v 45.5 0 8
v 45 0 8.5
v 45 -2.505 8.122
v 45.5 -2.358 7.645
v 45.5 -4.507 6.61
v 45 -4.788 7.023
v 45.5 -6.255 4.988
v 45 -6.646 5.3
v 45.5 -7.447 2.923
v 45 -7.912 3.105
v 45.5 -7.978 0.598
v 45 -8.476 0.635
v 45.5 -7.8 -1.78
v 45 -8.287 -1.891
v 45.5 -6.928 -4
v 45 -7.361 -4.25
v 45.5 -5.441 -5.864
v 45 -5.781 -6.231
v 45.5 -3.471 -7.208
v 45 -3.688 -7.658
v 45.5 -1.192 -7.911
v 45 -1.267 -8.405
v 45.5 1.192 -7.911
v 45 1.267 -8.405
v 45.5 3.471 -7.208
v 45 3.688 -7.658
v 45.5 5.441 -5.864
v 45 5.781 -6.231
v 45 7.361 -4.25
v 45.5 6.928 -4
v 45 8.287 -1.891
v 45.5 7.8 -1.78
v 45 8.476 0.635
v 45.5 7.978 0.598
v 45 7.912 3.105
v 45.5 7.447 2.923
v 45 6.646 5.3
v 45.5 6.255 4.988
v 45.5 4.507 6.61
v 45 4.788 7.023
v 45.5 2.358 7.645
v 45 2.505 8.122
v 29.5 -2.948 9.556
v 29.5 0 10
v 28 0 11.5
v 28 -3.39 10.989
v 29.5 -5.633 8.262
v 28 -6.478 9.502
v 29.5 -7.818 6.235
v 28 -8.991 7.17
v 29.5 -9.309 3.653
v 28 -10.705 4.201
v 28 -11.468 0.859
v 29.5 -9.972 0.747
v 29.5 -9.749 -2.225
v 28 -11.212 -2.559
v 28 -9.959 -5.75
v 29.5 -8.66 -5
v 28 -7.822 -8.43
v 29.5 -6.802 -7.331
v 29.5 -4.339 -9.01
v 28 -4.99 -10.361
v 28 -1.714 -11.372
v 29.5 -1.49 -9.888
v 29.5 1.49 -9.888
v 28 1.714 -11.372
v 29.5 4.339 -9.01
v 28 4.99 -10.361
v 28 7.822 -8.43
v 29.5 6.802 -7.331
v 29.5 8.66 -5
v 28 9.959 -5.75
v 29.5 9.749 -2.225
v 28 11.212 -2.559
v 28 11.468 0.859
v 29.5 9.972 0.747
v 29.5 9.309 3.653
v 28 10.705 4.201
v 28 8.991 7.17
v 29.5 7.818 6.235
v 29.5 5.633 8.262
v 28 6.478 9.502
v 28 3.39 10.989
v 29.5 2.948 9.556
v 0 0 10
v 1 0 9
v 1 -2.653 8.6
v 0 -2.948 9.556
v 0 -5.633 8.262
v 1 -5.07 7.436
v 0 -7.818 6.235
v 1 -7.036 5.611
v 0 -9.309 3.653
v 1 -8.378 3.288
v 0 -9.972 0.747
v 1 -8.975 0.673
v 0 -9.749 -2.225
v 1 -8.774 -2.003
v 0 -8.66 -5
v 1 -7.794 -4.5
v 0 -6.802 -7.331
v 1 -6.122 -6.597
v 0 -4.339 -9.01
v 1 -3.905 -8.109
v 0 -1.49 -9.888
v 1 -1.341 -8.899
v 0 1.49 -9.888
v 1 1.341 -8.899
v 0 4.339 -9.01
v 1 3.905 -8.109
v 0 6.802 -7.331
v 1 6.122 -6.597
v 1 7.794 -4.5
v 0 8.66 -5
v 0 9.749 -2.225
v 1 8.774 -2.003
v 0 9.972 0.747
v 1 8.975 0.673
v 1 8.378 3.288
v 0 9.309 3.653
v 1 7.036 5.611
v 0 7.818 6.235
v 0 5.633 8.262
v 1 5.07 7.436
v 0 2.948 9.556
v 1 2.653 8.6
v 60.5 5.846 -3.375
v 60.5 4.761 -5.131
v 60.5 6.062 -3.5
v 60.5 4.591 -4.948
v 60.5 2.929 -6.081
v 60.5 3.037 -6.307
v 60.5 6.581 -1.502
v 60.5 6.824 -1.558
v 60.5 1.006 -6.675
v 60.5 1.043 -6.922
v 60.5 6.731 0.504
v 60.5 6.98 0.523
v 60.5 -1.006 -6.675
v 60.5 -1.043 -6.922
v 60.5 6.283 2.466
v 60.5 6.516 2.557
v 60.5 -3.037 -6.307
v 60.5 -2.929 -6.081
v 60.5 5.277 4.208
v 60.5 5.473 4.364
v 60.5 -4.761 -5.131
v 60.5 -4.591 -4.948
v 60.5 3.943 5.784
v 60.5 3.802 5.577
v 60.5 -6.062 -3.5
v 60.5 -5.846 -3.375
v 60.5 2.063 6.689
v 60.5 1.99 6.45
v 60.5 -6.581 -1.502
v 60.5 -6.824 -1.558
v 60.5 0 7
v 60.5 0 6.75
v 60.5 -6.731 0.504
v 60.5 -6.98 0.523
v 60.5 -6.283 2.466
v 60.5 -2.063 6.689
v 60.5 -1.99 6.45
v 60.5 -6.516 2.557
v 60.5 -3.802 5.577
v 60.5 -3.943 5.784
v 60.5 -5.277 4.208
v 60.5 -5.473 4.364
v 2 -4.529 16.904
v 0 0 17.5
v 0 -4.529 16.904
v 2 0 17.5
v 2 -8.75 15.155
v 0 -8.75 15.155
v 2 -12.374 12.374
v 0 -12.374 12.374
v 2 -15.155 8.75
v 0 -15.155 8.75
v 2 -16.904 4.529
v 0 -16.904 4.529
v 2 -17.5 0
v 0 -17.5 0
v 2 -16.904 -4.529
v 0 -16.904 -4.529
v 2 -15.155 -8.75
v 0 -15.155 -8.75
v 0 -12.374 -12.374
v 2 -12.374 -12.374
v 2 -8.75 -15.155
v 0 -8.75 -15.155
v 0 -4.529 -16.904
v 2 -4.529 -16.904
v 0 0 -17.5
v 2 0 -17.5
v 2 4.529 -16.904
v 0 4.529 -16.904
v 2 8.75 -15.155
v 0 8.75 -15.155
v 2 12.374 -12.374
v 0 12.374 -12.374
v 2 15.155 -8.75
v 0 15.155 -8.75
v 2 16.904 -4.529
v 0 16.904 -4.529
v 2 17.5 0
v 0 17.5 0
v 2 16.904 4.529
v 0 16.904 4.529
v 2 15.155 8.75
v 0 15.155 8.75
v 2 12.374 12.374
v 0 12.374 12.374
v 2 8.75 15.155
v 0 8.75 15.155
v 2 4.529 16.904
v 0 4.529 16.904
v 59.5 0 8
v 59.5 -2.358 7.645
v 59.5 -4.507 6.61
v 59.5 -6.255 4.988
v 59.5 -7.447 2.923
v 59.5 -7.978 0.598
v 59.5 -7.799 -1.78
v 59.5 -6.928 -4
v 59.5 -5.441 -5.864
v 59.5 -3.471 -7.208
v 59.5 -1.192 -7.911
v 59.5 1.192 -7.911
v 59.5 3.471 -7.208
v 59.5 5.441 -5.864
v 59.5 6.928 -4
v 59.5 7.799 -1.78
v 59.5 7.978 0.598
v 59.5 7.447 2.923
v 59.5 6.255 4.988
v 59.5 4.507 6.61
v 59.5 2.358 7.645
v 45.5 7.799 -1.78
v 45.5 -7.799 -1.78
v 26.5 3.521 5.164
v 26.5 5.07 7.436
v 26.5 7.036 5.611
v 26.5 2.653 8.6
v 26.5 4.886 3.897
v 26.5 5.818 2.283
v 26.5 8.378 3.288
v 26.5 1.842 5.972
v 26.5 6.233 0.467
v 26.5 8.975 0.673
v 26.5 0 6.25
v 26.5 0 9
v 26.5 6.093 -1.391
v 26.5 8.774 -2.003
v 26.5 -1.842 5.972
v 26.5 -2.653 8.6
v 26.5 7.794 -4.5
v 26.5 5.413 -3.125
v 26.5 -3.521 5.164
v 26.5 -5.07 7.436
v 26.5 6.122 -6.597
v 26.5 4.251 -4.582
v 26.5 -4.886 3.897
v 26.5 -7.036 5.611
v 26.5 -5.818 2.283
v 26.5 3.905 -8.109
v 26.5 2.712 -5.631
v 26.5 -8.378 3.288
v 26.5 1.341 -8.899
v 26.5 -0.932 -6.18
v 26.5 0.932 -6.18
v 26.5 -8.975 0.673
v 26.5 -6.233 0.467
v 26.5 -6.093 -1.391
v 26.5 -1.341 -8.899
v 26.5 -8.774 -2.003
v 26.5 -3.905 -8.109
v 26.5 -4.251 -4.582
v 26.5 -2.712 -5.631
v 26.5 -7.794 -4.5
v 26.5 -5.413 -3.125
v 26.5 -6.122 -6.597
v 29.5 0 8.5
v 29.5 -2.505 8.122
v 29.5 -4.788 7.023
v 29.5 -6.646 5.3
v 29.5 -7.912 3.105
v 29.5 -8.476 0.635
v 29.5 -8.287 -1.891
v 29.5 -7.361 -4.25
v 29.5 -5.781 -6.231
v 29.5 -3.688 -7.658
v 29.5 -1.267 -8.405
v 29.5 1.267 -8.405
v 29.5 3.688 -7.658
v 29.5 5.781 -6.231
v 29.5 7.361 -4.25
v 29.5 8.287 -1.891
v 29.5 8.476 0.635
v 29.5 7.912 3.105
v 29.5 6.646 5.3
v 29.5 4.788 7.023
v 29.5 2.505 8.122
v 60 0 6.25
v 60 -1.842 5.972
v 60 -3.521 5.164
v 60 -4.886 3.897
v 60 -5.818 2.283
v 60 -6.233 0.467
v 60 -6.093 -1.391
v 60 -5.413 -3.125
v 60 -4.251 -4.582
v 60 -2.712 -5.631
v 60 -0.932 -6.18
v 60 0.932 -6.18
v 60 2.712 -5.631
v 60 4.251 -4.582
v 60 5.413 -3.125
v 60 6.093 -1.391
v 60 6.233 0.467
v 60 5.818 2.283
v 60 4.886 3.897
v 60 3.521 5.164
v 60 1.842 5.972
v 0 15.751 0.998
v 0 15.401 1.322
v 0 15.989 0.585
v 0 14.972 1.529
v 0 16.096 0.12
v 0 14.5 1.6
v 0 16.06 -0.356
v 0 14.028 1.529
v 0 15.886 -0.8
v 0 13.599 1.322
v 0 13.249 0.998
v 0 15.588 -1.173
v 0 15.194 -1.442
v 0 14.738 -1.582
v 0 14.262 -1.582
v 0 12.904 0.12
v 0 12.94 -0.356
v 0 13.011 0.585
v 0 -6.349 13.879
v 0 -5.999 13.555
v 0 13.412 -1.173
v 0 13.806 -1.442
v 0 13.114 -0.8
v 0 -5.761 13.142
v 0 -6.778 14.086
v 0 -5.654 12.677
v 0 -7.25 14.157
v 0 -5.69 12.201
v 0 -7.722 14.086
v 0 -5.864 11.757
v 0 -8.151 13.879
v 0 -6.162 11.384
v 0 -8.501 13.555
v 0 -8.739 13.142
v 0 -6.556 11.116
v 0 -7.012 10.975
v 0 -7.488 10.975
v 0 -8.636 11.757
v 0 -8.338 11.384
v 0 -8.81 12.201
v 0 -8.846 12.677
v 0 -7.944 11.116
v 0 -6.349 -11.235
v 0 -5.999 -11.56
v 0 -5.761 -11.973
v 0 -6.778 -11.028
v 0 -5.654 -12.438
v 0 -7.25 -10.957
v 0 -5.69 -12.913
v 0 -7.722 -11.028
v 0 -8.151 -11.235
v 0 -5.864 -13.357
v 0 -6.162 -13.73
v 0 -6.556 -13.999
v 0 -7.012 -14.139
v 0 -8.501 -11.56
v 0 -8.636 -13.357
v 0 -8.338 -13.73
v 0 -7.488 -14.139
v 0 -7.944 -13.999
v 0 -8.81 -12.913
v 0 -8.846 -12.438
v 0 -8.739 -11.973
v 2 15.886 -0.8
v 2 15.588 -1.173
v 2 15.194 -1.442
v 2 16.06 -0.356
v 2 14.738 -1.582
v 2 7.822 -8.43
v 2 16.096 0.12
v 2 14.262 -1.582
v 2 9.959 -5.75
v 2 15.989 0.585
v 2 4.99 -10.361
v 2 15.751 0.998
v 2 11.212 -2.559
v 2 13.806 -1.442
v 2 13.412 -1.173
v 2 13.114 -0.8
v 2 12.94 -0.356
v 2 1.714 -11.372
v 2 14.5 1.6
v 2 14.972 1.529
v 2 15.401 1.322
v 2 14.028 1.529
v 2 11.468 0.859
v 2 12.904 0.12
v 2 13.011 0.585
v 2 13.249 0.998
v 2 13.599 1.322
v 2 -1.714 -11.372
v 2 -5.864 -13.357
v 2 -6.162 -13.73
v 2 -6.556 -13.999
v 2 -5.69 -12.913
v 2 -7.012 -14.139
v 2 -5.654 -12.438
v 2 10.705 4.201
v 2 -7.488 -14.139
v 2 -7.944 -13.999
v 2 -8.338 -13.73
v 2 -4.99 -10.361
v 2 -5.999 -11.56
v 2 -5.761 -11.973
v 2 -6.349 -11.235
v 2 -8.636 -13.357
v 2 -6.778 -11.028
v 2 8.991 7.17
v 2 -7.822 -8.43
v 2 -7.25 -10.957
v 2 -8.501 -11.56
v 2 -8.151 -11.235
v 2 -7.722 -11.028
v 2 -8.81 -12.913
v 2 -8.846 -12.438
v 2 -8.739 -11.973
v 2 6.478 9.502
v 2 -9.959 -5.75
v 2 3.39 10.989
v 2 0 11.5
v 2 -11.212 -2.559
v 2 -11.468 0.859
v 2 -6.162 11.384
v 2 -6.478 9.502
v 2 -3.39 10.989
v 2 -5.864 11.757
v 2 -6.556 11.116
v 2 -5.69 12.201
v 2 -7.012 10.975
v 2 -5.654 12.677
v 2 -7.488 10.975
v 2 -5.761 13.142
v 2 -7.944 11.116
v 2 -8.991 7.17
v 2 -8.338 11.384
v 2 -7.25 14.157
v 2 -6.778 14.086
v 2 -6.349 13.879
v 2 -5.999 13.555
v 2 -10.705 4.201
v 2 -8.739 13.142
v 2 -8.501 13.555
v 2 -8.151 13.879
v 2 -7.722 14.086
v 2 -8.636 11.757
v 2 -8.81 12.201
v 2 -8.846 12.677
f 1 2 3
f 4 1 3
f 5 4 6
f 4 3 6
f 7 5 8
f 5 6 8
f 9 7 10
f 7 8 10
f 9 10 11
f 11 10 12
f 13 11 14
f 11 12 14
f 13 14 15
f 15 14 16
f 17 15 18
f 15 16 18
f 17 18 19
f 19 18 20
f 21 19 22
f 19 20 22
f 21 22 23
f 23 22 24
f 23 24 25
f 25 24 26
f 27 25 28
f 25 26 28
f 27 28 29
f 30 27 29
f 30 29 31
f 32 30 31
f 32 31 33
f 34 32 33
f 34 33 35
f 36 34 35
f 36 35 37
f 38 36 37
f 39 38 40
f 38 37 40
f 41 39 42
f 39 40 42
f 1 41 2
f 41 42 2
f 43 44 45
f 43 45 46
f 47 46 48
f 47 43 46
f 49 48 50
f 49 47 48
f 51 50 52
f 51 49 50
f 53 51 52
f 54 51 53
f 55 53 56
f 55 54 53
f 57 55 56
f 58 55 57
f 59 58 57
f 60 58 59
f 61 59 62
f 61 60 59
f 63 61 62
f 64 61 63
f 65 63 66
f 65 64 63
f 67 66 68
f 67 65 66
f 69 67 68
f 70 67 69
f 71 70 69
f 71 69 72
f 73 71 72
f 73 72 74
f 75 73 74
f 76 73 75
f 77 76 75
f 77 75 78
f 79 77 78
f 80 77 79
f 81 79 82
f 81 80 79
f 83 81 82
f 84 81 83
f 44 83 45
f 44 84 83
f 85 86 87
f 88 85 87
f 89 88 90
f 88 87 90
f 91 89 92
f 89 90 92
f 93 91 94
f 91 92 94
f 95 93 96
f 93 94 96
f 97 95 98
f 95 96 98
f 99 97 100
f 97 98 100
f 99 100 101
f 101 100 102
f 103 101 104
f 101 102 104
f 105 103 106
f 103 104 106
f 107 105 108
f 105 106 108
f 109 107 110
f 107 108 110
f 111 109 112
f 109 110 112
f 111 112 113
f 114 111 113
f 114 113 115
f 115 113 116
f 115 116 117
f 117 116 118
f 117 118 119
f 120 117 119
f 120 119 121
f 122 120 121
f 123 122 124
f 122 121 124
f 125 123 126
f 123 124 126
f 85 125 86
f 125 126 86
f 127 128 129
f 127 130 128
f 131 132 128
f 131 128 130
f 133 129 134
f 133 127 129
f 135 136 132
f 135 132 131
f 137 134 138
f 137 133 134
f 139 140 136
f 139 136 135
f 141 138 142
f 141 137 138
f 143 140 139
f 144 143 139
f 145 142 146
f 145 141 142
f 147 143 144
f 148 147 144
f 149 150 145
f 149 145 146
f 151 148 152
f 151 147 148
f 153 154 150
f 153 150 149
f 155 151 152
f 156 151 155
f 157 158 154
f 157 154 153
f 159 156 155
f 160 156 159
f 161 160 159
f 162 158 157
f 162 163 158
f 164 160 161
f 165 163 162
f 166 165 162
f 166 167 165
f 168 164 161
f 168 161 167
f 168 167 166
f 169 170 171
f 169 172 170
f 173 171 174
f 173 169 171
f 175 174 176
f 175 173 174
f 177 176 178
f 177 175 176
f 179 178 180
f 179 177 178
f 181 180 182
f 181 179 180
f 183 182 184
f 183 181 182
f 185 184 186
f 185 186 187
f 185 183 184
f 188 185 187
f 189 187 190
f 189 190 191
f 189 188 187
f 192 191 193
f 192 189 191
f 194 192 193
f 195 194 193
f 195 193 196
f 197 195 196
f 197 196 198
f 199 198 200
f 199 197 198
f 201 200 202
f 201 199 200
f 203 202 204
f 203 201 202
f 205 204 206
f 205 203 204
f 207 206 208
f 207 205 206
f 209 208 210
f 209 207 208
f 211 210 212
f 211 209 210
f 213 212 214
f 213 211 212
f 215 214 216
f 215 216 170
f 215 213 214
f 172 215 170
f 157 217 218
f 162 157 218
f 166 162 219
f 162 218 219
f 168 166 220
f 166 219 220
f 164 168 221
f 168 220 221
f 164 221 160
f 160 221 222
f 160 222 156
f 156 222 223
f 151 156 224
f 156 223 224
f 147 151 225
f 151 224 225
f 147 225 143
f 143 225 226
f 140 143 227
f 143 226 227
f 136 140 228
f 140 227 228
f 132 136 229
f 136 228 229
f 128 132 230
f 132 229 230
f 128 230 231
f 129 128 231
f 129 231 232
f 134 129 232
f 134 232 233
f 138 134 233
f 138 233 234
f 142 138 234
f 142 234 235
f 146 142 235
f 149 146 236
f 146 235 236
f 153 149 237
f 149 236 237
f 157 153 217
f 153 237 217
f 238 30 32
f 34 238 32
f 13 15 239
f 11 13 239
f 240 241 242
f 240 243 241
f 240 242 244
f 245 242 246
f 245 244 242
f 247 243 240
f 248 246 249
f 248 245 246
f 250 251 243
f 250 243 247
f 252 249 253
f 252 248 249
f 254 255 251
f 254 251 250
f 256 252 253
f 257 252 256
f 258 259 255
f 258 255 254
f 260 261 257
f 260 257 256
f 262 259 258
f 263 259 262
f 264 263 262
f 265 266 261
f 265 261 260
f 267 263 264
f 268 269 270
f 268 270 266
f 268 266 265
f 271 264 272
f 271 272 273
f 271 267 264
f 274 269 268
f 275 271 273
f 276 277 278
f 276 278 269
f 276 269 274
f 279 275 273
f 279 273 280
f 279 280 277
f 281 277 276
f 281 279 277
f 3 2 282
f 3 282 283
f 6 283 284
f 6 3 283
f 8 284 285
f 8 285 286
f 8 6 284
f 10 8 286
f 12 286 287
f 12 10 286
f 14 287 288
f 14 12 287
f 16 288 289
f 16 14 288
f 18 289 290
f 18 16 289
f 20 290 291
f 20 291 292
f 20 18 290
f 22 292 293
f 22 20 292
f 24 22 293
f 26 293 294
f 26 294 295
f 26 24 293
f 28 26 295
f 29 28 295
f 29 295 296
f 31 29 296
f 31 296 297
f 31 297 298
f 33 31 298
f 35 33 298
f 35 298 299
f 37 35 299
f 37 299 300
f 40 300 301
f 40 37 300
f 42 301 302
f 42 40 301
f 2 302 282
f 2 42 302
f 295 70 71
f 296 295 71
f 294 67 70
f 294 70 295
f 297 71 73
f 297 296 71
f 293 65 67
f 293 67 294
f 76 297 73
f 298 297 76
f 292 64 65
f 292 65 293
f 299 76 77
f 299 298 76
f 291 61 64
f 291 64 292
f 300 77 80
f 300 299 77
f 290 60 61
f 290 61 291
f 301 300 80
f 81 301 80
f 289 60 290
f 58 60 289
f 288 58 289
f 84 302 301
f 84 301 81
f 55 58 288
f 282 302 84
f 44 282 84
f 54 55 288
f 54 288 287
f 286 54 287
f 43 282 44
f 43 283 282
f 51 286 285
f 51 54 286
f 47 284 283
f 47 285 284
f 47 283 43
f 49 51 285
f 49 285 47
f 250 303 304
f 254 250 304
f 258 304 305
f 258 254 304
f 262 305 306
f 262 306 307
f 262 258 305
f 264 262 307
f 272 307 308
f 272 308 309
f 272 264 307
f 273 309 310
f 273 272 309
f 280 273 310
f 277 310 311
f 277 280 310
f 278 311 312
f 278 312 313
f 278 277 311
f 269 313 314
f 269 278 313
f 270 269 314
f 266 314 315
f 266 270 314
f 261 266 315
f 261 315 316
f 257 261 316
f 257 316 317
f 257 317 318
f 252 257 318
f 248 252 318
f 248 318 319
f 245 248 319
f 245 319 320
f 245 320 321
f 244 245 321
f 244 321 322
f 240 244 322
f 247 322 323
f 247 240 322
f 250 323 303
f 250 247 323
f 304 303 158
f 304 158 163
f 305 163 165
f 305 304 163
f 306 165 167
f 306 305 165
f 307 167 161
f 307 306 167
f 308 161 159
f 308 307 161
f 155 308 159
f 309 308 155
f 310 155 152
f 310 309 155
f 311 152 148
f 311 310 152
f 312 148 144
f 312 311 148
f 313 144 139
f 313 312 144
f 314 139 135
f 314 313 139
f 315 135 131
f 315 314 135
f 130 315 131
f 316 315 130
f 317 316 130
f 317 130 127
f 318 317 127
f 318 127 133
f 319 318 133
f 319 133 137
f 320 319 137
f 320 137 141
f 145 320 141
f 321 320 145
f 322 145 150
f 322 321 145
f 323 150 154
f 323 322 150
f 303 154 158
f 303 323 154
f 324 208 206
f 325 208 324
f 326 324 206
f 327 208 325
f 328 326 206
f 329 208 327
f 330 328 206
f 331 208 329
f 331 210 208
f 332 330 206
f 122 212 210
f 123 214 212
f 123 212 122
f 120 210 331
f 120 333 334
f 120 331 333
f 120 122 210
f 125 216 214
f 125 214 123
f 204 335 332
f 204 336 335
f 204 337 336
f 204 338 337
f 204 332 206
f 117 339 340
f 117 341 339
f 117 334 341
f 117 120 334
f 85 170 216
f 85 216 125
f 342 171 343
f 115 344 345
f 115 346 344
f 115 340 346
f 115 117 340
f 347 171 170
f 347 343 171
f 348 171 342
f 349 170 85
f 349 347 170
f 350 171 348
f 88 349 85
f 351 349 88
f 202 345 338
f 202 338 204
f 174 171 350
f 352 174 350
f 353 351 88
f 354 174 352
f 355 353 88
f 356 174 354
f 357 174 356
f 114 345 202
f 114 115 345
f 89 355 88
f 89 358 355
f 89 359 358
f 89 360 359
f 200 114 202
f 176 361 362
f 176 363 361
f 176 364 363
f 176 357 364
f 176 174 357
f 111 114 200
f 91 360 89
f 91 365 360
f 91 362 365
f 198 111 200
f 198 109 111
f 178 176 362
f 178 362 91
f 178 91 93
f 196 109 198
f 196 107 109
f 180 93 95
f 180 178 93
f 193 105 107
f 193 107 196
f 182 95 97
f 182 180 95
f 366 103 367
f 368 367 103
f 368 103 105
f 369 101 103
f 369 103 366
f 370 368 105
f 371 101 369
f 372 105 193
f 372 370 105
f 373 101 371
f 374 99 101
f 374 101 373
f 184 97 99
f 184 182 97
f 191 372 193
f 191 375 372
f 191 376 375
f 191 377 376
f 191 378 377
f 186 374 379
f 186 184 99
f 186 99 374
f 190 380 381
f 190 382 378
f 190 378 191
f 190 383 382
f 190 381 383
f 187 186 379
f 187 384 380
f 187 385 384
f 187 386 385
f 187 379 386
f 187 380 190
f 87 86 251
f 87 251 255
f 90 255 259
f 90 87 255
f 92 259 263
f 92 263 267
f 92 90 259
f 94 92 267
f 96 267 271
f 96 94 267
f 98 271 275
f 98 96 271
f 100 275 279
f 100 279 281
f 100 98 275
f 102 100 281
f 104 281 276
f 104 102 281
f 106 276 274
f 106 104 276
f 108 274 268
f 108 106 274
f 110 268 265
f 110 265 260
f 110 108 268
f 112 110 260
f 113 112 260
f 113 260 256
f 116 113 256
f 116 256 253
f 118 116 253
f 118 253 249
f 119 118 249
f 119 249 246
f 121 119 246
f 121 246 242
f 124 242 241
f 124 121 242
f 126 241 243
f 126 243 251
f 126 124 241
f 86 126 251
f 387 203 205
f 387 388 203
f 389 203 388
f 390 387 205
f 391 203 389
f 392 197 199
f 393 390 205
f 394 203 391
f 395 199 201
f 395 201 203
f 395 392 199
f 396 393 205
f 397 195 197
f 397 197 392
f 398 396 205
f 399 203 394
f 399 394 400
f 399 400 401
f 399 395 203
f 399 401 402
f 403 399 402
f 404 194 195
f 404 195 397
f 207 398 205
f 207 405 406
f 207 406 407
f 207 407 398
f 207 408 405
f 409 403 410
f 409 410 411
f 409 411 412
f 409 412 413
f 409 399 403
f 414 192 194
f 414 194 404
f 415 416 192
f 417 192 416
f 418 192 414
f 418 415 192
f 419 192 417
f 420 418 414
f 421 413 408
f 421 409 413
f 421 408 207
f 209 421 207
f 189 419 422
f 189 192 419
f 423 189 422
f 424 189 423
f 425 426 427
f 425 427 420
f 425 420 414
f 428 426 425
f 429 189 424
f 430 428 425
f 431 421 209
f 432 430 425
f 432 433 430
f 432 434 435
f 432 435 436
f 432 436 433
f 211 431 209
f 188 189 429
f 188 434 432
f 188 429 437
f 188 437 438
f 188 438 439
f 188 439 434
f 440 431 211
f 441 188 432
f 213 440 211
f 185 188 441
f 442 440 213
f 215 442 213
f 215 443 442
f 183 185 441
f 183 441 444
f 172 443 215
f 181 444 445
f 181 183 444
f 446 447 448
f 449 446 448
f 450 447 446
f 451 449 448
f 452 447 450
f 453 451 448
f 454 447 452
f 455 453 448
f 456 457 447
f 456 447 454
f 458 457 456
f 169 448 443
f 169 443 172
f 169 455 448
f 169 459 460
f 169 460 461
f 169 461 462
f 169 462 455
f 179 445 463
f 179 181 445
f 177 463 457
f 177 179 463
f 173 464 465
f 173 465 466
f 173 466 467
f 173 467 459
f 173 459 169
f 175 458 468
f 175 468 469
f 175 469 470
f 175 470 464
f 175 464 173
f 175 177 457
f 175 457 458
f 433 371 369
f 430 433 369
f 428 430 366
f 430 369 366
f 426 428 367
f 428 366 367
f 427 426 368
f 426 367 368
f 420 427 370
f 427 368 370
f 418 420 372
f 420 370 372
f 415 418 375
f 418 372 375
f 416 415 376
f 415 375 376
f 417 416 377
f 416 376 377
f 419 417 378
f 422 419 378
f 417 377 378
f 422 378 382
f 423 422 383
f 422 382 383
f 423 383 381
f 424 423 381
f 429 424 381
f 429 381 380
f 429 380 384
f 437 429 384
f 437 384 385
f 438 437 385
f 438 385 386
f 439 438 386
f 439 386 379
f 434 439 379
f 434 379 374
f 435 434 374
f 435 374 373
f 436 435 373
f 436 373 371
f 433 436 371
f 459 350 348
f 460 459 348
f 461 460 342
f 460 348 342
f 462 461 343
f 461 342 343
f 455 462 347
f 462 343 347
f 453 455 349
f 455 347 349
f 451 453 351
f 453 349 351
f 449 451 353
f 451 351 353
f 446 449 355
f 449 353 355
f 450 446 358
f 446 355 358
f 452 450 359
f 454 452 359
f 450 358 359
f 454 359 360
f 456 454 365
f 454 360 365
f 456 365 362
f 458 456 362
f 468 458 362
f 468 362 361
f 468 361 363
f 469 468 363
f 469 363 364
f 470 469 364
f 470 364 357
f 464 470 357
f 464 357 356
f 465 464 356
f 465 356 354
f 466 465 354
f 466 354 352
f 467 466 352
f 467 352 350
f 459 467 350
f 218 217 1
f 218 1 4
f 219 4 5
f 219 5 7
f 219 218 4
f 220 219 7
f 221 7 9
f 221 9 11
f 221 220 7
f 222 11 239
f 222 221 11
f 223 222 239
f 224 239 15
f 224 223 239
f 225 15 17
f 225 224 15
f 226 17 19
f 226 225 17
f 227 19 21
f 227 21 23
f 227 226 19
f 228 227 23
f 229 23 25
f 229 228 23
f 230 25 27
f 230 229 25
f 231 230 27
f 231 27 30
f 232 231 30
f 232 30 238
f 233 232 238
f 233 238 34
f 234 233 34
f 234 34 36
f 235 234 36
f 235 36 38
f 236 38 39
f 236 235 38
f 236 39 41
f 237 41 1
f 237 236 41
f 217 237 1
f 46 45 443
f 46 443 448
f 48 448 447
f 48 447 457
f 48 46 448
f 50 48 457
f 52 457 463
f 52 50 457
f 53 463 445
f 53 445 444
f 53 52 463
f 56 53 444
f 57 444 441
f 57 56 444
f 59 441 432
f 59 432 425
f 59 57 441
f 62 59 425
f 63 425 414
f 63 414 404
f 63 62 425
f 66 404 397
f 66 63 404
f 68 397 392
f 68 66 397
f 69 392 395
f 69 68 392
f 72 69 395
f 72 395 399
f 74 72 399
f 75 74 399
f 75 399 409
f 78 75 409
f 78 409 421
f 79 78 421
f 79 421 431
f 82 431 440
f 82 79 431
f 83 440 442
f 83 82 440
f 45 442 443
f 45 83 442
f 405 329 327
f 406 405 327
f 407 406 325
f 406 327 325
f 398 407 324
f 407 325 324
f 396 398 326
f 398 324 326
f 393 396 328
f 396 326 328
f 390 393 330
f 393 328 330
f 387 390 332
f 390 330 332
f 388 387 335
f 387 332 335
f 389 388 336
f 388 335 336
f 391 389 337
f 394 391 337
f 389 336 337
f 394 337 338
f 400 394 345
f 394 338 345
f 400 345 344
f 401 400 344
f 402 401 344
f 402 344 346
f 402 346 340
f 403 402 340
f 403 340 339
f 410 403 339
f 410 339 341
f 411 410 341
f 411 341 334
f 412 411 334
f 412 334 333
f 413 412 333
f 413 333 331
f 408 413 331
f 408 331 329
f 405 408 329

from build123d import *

# Parameters (mm, degrees)
CHAMFER_1_SIZE      = 1.5
CHAMFER_2_SIZE      = 1
CHAMFER_3_SIZE      = 1
CHAMFER_4_SIZE      = 0.5
SKETCH_2_R          = 1.6
CUT_EXTRUDE_1_DEPTH = 10


with BuildPart() as part:
    # Эскиз1 → Повернуть1 (revolve)
    with BuildSketch(Plane.XY, mode=Mode.PRIVATE) as revolve_1_sk:
        Polygon((26.5, 6.25), (26.5, 9), (0, 9), (0, 17.5), (2, 17.5), (2, 11.5), (29.5, 11.5), (29.5, 8.5), (45.5, 8.5), (45.5, 8), (60.5, 8), (60.5, 6.25), align=None)
    revolve(revolve_1_sk.sketch.rotate(Axis((0, 0, 0), (1, 0, 0)), 90), axis=Axis((0, 0, 0), (1, 0, 0)))

    # Фаска1
    chamfer_1_edges = [part.edges().sort_by_distance(p)[0] for p in [
        (29.5, 0, -11.5),
    ]]
    chamfer(chamfer_1_edges, length=CHAMFER_1_SIZE)

    # Фаска2
    chamfer_2_edges = [part.edges().sort_by_distance(p)[0] for p in [
        (0, 0, -9),
    ]]
    chamfer(chamfer_2_edges, length=CHAMFER_2_SIZE)

    # Фаска3
    chamfer_3_edges = [part.edges().sort_by_distance(p)[0] for p in [
        (60.5, 0, -8),
    ]]
    chamfer(chamfer_3_edges, length=CHAMFER_3_SIZE)

    # Фаска4
    chamfer_4_edges = [part.edges().sort_by_distance(p)[0] for p in [
        (45.5, 0, -8.5),
        (60.5, 0, -6.25),
    ]]
    chamfer(chamfer_4_edges, length=CHAMFER_4_SIZE - 0.0001)  # a hair under: the kernel refuses the full size

    # Эскиз2 → Вырез-Вытянуть1 (cut)
    with BuildSketch(Plane.ZY):
        with Locations((0, 14.5)):
            Circle(SKETCH_2_R)
        with Locations((12.557368355, -7.25)):
            Circle(SKETCH_2_R)
        with Locations((-12.557368355, -7.25)):
            Circle(SKETCH_2_R)
    extrude(amount=-CUT_EXTRUDE_1_DEPTH, mode=Mode.SUBTRACT)


solid = part.part
